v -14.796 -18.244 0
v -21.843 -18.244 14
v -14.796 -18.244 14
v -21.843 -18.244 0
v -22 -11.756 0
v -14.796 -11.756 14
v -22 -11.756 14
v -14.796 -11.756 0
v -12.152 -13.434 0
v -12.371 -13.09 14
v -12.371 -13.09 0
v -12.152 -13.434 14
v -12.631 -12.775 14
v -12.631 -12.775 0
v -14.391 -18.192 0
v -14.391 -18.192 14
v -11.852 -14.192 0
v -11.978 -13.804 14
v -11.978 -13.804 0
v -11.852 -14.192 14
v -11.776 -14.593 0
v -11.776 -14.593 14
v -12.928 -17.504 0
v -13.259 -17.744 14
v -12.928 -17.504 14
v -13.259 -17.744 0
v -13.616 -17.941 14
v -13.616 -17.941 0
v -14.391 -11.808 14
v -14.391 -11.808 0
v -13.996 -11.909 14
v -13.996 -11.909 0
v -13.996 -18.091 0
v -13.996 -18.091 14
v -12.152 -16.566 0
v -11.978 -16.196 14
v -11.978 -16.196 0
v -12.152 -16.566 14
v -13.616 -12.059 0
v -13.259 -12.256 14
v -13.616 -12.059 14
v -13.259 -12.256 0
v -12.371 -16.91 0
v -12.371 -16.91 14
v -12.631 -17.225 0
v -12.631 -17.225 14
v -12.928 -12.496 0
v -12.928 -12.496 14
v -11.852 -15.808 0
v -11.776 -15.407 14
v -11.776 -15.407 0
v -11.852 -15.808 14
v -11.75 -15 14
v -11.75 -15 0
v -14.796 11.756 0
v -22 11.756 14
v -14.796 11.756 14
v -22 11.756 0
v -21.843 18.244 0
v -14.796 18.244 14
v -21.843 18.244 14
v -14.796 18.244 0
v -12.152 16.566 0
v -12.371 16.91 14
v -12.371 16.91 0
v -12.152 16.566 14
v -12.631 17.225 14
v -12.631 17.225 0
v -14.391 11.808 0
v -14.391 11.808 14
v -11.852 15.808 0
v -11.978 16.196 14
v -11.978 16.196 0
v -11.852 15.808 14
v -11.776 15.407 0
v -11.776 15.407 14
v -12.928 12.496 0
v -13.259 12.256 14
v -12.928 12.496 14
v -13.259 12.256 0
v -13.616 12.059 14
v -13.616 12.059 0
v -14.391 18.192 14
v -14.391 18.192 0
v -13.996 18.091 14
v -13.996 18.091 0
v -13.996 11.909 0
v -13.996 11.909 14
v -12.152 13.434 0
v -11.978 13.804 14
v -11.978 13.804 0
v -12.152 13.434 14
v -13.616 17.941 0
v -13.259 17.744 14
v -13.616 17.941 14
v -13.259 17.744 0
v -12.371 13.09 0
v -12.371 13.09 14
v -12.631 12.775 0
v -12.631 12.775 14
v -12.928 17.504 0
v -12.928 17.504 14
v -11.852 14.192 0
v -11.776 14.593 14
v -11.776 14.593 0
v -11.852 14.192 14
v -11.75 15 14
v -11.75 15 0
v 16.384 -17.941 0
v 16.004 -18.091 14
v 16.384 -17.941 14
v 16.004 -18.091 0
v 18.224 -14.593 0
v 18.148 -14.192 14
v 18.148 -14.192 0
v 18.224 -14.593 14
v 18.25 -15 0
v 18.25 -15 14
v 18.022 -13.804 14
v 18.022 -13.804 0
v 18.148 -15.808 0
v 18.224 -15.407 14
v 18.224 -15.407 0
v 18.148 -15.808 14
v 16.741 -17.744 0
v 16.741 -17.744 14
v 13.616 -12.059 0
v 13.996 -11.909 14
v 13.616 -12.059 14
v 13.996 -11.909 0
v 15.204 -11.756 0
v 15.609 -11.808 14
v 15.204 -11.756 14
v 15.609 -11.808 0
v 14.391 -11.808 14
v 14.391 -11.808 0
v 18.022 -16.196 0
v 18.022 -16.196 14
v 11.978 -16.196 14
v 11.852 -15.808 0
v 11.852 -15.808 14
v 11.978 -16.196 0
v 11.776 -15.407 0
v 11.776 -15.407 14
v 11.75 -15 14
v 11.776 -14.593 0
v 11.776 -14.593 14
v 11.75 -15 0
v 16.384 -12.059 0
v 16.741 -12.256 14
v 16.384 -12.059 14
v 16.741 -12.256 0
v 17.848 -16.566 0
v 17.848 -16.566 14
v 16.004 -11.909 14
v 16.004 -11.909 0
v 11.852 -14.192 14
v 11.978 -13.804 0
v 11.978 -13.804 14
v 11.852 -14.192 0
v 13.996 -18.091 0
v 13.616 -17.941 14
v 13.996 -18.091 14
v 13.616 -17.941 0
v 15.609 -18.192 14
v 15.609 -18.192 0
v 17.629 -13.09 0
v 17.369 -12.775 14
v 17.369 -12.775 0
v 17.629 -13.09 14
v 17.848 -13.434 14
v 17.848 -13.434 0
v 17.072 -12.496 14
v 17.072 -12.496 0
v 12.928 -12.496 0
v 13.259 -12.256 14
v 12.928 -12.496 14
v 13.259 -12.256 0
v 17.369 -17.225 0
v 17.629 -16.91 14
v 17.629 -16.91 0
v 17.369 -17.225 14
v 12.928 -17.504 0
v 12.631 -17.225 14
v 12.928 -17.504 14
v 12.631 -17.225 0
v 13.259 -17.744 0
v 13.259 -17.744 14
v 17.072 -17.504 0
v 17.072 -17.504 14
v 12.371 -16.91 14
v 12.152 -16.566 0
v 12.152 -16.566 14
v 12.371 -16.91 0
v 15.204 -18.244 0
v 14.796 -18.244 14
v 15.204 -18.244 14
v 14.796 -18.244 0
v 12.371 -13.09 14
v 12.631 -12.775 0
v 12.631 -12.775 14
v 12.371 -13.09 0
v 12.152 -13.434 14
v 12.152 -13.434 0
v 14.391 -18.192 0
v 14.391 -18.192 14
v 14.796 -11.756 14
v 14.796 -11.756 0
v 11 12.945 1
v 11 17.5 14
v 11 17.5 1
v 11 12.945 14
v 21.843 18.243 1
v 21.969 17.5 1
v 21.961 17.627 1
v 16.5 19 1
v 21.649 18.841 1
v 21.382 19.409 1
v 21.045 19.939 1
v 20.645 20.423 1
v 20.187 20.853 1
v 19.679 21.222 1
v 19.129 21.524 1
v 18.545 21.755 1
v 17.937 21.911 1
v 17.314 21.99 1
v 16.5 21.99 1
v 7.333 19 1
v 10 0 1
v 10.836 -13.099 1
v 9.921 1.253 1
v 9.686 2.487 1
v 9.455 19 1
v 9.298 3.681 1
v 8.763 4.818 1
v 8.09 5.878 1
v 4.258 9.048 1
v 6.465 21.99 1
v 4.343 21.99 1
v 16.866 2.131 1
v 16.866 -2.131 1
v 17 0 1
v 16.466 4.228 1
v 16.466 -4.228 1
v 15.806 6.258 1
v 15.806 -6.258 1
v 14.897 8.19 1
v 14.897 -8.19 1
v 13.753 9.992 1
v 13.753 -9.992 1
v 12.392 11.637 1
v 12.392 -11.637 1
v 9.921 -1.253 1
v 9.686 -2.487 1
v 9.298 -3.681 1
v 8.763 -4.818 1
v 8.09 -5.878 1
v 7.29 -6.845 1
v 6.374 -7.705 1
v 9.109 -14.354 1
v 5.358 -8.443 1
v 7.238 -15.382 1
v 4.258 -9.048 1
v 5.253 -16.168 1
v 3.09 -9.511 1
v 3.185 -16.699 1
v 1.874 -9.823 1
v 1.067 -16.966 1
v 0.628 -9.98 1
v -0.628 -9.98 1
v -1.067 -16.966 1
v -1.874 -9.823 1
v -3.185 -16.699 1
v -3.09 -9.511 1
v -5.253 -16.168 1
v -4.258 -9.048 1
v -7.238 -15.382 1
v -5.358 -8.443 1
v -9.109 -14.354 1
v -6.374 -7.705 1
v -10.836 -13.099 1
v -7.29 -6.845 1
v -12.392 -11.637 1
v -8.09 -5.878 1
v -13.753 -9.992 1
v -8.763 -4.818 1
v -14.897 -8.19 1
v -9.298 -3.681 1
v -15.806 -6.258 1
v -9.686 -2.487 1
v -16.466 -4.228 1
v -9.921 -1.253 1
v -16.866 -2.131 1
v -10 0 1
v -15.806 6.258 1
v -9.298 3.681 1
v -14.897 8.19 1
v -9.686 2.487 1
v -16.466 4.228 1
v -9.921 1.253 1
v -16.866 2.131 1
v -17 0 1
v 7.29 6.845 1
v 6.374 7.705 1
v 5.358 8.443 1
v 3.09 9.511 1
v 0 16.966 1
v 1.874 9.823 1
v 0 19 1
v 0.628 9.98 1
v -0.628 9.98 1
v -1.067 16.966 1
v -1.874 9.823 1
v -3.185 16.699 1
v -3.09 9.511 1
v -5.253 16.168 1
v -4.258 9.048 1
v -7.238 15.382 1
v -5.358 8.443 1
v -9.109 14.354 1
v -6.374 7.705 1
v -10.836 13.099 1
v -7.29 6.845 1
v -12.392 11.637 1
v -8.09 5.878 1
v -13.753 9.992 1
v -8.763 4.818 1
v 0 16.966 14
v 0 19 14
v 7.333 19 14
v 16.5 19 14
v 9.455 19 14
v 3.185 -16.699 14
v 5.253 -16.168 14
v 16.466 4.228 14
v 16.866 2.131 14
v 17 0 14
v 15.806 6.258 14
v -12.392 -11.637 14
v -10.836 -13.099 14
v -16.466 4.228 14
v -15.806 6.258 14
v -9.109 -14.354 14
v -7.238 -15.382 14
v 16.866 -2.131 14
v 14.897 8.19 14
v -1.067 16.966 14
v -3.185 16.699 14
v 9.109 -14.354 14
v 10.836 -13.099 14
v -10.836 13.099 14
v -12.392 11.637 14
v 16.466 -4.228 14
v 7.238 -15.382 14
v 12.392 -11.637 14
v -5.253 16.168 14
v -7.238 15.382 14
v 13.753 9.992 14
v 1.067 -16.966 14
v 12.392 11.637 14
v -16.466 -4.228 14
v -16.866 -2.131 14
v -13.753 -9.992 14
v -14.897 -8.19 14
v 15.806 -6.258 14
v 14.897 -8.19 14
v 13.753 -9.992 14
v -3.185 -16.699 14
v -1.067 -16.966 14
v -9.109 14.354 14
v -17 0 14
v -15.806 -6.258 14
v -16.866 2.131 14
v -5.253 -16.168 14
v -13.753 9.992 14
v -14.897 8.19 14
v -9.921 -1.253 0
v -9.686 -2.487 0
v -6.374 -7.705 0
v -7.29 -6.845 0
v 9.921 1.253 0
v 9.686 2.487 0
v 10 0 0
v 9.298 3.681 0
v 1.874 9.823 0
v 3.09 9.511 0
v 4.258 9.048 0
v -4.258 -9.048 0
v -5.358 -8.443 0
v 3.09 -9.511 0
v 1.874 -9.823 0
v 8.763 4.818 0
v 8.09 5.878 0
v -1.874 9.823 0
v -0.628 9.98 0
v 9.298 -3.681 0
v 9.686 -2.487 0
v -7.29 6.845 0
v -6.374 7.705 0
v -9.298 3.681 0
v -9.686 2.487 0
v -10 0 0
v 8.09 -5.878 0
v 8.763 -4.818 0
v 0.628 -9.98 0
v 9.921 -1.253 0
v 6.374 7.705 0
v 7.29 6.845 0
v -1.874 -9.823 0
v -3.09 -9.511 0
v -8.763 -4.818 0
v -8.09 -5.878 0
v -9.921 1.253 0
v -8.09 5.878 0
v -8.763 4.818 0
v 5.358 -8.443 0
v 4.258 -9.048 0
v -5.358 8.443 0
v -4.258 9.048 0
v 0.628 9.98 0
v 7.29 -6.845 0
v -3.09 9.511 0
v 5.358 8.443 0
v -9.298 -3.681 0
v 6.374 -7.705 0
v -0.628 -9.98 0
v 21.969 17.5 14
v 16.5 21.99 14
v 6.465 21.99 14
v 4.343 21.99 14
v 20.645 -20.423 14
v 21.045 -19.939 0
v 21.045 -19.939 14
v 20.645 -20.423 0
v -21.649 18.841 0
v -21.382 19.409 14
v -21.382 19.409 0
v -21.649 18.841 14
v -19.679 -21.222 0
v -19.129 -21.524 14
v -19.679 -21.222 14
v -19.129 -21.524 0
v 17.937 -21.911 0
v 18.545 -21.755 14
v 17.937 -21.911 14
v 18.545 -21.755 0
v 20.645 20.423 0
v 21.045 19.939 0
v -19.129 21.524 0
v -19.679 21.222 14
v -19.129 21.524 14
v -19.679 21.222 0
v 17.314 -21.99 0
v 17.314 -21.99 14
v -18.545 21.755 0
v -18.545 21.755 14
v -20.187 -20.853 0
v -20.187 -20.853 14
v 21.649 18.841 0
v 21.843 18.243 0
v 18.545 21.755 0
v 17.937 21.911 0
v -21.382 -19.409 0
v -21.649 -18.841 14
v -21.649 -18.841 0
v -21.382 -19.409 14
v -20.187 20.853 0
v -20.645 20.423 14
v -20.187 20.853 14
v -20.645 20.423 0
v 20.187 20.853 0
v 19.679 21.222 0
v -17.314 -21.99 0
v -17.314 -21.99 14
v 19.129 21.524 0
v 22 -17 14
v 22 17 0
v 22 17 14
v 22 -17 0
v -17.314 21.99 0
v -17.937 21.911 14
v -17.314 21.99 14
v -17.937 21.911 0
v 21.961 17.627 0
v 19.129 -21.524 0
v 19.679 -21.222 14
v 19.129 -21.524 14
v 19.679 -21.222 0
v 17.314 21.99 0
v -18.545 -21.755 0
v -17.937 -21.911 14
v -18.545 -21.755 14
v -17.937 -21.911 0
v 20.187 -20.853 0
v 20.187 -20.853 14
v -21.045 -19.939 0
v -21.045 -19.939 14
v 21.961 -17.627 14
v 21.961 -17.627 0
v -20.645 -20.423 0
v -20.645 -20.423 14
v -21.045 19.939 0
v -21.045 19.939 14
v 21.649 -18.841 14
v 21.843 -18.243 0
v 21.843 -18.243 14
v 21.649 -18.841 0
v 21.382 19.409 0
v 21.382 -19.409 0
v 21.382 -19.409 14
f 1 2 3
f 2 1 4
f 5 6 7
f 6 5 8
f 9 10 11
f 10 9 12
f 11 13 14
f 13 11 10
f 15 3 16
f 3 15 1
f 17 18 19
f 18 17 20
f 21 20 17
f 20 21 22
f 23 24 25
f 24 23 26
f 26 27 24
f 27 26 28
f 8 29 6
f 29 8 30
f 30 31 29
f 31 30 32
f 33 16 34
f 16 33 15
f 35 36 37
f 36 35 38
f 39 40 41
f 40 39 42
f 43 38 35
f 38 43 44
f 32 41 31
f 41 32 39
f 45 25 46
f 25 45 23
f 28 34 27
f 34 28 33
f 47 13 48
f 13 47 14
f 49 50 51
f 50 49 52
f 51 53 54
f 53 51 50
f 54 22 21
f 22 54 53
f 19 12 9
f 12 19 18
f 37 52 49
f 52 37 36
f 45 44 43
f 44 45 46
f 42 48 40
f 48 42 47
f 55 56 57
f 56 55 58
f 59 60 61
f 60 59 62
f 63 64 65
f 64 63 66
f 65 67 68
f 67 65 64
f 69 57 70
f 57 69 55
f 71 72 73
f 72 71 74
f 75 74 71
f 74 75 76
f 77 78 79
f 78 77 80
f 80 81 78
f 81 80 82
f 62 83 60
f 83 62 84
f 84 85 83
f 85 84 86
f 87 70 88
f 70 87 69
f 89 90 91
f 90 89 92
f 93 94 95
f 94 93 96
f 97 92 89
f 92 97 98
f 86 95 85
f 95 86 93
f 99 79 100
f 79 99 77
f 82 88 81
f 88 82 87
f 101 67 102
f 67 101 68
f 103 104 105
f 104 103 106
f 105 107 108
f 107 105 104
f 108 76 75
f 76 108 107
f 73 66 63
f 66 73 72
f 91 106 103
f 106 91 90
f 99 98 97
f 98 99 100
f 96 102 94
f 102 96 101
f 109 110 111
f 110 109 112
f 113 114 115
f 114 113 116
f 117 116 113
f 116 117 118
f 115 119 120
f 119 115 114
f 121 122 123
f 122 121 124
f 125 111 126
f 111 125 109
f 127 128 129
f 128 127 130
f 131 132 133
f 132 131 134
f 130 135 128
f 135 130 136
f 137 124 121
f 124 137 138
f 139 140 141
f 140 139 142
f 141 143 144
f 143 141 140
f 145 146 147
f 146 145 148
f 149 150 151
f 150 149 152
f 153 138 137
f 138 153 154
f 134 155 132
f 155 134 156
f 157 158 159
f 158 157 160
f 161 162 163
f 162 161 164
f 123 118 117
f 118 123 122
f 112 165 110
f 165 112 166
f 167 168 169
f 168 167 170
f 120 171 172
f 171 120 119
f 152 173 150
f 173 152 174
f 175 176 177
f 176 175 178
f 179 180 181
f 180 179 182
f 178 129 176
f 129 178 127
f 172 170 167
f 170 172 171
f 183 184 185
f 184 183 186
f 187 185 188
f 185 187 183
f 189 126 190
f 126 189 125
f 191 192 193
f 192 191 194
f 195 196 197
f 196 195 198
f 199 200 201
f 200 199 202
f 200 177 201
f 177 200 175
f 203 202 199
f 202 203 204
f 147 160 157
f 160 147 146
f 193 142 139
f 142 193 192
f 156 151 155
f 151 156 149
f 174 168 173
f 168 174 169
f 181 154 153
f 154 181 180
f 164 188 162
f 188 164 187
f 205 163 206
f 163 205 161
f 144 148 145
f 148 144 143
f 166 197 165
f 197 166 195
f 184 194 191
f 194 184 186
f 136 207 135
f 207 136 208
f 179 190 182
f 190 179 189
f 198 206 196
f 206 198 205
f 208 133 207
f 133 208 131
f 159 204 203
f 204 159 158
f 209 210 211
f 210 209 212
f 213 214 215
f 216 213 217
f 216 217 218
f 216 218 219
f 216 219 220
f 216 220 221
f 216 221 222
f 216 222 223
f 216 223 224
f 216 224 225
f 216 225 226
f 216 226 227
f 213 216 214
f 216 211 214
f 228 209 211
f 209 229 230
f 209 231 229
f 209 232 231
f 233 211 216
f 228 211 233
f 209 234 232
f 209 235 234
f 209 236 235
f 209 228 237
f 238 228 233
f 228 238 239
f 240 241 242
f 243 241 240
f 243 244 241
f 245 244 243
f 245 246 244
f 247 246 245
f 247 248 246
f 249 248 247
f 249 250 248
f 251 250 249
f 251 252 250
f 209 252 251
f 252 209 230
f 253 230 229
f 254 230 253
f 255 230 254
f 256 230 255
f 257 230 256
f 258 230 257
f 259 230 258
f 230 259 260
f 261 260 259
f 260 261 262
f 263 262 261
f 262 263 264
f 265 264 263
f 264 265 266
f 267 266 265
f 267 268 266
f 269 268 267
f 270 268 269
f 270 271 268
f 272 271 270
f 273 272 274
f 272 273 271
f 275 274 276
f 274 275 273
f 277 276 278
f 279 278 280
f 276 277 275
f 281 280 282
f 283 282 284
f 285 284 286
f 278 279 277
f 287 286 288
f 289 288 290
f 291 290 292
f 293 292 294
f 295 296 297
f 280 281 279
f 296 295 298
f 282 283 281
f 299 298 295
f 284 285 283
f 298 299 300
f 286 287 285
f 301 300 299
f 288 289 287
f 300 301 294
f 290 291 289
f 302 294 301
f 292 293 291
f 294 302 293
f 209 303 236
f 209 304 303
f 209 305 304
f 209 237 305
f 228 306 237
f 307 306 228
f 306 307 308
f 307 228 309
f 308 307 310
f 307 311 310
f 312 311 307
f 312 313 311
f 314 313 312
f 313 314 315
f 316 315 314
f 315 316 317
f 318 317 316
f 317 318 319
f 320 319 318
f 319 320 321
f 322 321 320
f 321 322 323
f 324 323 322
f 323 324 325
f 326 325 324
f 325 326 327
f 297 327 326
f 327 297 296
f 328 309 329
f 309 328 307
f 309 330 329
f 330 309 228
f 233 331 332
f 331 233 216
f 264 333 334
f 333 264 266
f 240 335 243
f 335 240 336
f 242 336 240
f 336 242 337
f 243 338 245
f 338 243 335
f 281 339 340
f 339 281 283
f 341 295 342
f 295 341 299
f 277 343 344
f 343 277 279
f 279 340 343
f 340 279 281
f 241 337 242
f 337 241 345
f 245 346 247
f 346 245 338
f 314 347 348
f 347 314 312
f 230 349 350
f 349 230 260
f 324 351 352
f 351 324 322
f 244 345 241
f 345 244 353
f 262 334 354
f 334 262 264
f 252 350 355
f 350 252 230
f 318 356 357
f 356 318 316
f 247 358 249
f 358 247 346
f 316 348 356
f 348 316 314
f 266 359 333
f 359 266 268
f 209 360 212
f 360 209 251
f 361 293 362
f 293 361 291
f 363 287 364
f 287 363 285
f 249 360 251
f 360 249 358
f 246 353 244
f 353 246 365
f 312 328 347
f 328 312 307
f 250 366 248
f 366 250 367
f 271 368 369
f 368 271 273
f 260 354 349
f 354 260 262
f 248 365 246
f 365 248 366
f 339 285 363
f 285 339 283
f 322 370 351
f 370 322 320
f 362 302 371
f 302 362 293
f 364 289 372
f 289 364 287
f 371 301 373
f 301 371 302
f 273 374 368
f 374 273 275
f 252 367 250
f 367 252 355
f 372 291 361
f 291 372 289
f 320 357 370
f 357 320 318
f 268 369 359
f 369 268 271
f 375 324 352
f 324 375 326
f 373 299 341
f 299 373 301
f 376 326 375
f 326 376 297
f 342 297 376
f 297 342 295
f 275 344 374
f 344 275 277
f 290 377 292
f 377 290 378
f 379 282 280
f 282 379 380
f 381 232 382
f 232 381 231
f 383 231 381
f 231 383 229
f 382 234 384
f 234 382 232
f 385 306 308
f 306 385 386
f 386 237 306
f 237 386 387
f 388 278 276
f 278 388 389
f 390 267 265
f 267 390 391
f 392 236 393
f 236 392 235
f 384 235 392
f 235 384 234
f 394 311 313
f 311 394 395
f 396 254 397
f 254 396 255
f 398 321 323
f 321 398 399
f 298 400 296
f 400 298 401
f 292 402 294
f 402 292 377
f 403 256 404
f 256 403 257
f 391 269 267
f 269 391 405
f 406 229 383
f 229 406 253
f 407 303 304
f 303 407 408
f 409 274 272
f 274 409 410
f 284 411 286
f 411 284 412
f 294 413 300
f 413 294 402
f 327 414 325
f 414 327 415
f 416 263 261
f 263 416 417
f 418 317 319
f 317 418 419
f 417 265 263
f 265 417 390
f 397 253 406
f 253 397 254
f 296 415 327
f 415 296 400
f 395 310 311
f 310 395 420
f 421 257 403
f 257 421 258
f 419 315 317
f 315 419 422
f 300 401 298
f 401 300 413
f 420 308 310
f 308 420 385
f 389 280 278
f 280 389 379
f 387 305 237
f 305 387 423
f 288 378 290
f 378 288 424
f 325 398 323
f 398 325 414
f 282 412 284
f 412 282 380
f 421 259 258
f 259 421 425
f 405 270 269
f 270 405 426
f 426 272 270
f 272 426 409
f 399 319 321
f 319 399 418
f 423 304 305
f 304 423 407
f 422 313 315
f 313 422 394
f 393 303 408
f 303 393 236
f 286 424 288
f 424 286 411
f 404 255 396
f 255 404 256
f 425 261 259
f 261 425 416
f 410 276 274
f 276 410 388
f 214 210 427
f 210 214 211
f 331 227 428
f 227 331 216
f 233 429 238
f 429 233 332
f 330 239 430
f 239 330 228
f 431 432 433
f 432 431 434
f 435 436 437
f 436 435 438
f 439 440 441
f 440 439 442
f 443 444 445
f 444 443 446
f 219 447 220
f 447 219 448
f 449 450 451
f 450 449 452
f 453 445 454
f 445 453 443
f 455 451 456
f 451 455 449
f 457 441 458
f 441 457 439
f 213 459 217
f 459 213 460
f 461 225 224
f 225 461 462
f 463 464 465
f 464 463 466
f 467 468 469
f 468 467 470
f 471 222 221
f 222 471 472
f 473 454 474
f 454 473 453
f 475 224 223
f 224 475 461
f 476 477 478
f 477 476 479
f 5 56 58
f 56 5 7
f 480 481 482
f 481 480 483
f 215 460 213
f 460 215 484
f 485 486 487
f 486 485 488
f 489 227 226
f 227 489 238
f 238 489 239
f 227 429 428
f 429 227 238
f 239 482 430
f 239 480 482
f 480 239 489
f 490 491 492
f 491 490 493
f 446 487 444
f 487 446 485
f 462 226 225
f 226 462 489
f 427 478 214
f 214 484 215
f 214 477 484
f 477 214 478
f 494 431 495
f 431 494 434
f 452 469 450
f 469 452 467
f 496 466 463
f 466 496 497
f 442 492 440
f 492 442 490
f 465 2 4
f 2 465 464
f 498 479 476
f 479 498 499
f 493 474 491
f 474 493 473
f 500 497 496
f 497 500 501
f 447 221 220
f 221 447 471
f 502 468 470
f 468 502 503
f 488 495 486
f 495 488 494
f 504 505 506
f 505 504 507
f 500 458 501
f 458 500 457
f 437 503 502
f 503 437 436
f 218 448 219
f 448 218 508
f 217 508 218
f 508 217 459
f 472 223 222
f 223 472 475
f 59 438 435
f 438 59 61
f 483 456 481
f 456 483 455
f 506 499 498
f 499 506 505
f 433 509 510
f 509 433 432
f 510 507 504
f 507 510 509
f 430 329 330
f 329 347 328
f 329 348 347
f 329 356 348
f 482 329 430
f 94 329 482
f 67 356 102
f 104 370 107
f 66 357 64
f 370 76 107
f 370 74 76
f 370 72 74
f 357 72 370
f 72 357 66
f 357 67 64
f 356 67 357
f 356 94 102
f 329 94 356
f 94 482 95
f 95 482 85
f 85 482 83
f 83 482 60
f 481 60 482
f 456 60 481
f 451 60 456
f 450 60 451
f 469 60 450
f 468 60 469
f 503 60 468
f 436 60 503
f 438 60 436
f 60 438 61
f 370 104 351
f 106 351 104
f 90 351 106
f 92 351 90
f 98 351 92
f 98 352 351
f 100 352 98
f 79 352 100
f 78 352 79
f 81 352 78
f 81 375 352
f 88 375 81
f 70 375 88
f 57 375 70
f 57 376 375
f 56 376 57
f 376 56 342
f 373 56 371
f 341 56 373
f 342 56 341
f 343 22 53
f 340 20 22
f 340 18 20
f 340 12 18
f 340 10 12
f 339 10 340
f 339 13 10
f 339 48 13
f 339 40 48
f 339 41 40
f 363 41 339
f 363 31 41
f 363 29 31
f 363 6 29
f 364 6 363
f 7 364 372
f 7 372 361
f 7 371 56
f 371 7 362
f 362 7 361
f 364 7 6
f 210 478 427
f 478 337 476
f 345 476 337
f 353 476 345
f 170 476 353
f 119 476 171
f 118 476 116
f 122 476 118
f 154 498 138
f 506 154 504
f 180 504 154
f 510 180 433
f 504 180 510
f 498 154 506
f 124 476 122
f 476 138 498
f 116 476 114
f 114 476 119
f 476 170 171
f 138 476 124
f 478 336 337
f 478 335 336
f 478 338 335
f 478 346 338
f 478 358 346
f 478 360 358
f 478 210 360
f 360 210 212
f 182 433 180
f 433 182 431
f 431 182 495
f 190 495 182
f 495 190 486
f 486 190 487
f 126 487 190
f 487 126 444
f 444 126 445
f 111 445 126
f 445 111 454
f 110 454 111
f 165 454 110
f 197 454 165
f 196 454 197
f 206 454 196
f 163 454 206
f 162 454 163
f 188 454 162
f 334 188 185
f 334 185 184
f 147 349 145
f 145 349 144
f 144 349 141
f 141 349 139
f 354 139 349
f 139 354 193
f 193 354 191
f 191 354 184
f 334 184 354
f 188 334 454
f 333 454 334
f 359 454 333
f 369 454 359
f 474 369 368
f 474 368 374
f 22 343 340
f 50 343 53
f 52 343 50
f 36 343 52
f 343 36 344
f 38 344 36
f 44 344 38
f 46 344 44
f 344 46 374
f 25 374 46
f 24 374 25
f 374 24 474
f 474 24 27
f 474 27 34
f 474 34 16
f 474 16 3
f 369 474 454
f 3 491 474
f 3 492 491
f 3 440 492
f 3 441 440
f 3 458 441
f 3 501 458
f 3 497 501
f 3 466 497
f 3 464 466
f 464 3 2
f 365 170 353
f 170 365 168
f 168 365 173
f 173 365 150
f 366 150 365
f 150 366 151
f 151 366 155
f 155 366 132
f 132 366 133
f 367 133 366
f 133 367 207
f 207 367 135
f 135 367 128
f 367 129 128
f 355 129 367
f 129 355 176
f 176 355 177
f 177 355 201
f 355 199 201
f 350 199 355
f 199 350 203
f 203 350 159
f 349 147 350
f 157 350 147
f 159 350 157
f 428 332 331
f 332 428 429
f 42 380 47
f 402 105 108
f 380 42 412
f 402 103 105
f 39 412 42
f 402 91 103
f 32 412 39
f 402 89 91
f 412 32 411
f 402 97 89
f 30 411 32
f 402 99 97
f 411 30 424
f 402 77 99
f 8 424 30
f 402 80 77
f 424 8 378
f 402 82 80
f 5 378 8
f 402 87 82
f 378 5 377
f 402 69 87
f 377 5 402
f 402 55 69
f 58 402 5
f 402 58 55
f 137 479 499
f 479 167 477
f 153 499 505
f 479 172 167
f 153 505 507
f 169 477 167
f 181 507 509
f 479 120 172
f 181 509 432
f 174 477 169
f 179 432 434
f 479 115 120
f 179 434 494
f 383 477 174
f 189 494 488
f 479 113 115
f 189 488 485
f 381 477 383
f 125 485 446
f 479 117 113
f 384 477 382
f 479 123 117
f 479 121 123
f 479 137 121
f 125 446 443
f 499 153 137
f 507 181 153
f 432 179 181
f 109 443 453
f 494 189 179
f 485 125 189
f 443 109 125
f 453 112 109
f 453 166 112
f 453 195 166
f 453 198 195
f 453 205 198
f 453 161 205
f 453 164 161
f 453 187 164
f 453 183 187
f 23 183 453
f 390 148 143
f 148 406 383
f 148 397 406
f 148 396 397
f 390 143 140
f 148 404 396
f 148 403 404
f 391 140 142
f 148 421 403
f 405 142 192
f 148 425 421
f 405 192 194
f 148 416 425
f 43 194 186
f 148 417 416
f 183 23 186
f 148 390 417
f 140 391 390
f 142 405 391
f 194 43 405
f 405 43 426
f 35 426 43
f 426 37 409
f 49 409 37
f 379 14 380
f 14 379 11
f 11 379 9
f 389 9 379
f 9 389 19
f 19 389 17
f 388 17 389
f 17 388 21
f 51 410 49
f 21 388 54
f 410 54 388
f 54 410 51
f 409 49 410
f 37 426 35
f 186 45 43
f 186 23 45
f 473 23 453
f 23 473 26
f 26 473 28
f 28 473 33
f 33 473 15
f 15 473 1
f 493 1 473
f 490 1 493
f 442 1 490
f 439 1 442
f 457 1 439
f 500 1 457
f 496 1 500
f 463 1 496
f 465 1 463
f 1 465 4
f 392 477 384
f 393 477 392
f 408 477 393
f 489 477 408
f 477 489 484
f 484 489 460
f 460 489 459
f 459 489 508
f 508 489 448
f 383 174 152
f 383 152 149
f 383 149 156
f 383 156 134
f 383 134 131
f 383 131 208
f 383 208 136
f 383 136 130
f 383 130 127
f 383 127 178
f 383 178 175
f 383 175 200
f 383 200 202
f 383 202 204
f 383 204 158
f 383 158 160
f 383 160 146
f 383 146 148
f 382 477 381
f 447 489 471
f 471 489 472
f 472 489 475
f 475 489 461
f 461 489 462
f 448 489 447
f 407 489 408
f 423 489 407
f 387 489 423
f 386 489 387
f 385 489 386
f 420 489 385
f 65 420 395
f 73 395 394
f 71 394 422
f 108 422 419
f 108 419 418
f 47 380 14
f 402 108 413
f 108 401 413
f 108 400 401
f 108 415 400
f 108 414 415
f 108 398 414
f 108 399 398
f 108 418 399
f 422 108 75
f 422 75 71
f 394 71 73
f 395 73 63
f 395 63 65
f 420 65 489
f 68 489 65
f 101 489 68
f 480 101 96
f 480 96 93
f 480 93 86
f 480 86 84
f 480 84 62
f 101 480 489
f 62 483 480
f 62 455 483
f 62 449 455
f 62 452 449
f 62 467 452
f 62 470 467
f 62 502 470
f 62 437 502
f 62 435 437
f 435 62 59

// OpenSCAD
$fn = 50;


difference() {
	union() {
		translate(v = [0, 0, 0]) {
			rotate(a = [0, 0, 0]) {
				hull() {
					translate(v = [-17.0000000000, 17.0000000000, 0]) {
						rotate(a = [0, 0, 0]) {
							translate(v = [0, 0, 0]) {
								rotate(a = [0, 0, 0]) {
									cylinder(h = 14, r = 5);
								}
							}
						}
					}
					translate(v = [17.0000000000, 17.0000000000, 0]) {
						rotate(a = [0, 0, 0]) {
							translate(v = [0, 0, 0]) {
								rotate(a = [0, 0, 0]) {
									cylinder(h = 14, r = 5);
								}
							}
						}
					}
					translate(v = [-17.0000000000, -17.0000000000, 0]) {
						rotate(a = [0, 0, 0]) {
							translate(v = [0, 0, 0]) {
								rotate(a = [0, 0, 0]) {
									cylinder(h = 14, r = 5);
								}
							}
						}
					}
					translate(v = [17.0000000000, -17.0000000000, 0]) {
						rotate(a = [0, 0, 0]) {
							translate(v = [0, 0, 0]) {
								rotate(a = [0, 0, 0]) {
									cylinder(h = 14, r = 5);
								}
							}
						}
					}
				}
			}
		}
	}
	union() {
		translate(v = [-22.5000000000, -15.0000000000, -125]) {
			rotate(a = [0, 0, 0]) {
				hull() {
					translate(v = [7.5000000000, 0, 0]) {
						rotate(a = [0, 0, 0]) {
							translate(v = [0, 0, 0]) {
								rotate(a = [0, 0, 0]) {
									cylinder(h = 250, r = 3.2500000000);
								}
							}
						}
					}
					translate(v = [-7.5000000000, 0, 0]) {
						rotate(a = [0, 0, 0]) {
							translate(v = [0, 0, 0]) {
								rotate(a = [0, 0, 0]) {
									cylinder(h = 250, r = 3.2500000000);
								}
							}
						}
					}
				}
			}
		}
		translate(v = [-22.5000000000, 15.0000000000, -125]) {
			rotate(a = [0, 0, 0]) {
				hull() {
					translate(v = [7.5000000000, 0, 0]) {
						rotate(a = [0, 0, 0]) {
							translate(v = [0, 0, 0]) {
								rotate(a = [0, 0, 0]) {
									cylinder(h = 250, r = 3.2500000000);
								}
							}
						}
					}
					translate(v = [-7.5000000000, 0, 0]) {
						rotate(a = [0, 0, 0]) {
							translate(v = [0, 0, 0]) {
								rotate(a = [0, 0, 0]) {
									cylinder(h = 250, r = 3.2500000000);
								}
							}
						}
					}
				}
			}
		}
		translate(v = [15.0000000000, -15.0000000000, -125.0000000000]) {
			rotate(a = [0, 0, 0]) {
				cylinder(h = 250, r = 3.2500000000);
			}
		}
		translate(v = [0.0000000000, 11.0000000000, 1.0000000000]) {
			rotate(a = [0, 0, 0]) {
				cube(size = [11, 8, 16]);
			}
		}
		translate(v = [0, 0, 1.0000000000]) {
			rotate(a = [0, 0, 0]) {
				cylinder(h = 16, r = 17.0000000000);
			}
		}
		translate(v = [0, 0, -7.0000000000]) {
			rotate(a = [0, 0, 0]) {
				cylinder(h = 14, r = 10.0000000000);
			}
		}
		translate(v = [0.0000000000, 17.5000000000, 1]) {
			rotate(a = [0, 0, 0]) {
				cube(size = [22.0000000000, 1.5000000000, 16]);
			}
		}
		translate(v = [16.5000000000, 17.5000000000, 1]) {
			rotate(a = [0, 0, 0]) {
				cube(size = [5.5000000000, 4.5000000000, 16]);
			}
		}
		translate(v = [3.5833333333, 22.7500000000, 1]) {
			rotate(a = [0, 0, -45]) {
				cube(size = [7.5000000000, 1.5000000000, 16]);
			}
		}
	}
}
